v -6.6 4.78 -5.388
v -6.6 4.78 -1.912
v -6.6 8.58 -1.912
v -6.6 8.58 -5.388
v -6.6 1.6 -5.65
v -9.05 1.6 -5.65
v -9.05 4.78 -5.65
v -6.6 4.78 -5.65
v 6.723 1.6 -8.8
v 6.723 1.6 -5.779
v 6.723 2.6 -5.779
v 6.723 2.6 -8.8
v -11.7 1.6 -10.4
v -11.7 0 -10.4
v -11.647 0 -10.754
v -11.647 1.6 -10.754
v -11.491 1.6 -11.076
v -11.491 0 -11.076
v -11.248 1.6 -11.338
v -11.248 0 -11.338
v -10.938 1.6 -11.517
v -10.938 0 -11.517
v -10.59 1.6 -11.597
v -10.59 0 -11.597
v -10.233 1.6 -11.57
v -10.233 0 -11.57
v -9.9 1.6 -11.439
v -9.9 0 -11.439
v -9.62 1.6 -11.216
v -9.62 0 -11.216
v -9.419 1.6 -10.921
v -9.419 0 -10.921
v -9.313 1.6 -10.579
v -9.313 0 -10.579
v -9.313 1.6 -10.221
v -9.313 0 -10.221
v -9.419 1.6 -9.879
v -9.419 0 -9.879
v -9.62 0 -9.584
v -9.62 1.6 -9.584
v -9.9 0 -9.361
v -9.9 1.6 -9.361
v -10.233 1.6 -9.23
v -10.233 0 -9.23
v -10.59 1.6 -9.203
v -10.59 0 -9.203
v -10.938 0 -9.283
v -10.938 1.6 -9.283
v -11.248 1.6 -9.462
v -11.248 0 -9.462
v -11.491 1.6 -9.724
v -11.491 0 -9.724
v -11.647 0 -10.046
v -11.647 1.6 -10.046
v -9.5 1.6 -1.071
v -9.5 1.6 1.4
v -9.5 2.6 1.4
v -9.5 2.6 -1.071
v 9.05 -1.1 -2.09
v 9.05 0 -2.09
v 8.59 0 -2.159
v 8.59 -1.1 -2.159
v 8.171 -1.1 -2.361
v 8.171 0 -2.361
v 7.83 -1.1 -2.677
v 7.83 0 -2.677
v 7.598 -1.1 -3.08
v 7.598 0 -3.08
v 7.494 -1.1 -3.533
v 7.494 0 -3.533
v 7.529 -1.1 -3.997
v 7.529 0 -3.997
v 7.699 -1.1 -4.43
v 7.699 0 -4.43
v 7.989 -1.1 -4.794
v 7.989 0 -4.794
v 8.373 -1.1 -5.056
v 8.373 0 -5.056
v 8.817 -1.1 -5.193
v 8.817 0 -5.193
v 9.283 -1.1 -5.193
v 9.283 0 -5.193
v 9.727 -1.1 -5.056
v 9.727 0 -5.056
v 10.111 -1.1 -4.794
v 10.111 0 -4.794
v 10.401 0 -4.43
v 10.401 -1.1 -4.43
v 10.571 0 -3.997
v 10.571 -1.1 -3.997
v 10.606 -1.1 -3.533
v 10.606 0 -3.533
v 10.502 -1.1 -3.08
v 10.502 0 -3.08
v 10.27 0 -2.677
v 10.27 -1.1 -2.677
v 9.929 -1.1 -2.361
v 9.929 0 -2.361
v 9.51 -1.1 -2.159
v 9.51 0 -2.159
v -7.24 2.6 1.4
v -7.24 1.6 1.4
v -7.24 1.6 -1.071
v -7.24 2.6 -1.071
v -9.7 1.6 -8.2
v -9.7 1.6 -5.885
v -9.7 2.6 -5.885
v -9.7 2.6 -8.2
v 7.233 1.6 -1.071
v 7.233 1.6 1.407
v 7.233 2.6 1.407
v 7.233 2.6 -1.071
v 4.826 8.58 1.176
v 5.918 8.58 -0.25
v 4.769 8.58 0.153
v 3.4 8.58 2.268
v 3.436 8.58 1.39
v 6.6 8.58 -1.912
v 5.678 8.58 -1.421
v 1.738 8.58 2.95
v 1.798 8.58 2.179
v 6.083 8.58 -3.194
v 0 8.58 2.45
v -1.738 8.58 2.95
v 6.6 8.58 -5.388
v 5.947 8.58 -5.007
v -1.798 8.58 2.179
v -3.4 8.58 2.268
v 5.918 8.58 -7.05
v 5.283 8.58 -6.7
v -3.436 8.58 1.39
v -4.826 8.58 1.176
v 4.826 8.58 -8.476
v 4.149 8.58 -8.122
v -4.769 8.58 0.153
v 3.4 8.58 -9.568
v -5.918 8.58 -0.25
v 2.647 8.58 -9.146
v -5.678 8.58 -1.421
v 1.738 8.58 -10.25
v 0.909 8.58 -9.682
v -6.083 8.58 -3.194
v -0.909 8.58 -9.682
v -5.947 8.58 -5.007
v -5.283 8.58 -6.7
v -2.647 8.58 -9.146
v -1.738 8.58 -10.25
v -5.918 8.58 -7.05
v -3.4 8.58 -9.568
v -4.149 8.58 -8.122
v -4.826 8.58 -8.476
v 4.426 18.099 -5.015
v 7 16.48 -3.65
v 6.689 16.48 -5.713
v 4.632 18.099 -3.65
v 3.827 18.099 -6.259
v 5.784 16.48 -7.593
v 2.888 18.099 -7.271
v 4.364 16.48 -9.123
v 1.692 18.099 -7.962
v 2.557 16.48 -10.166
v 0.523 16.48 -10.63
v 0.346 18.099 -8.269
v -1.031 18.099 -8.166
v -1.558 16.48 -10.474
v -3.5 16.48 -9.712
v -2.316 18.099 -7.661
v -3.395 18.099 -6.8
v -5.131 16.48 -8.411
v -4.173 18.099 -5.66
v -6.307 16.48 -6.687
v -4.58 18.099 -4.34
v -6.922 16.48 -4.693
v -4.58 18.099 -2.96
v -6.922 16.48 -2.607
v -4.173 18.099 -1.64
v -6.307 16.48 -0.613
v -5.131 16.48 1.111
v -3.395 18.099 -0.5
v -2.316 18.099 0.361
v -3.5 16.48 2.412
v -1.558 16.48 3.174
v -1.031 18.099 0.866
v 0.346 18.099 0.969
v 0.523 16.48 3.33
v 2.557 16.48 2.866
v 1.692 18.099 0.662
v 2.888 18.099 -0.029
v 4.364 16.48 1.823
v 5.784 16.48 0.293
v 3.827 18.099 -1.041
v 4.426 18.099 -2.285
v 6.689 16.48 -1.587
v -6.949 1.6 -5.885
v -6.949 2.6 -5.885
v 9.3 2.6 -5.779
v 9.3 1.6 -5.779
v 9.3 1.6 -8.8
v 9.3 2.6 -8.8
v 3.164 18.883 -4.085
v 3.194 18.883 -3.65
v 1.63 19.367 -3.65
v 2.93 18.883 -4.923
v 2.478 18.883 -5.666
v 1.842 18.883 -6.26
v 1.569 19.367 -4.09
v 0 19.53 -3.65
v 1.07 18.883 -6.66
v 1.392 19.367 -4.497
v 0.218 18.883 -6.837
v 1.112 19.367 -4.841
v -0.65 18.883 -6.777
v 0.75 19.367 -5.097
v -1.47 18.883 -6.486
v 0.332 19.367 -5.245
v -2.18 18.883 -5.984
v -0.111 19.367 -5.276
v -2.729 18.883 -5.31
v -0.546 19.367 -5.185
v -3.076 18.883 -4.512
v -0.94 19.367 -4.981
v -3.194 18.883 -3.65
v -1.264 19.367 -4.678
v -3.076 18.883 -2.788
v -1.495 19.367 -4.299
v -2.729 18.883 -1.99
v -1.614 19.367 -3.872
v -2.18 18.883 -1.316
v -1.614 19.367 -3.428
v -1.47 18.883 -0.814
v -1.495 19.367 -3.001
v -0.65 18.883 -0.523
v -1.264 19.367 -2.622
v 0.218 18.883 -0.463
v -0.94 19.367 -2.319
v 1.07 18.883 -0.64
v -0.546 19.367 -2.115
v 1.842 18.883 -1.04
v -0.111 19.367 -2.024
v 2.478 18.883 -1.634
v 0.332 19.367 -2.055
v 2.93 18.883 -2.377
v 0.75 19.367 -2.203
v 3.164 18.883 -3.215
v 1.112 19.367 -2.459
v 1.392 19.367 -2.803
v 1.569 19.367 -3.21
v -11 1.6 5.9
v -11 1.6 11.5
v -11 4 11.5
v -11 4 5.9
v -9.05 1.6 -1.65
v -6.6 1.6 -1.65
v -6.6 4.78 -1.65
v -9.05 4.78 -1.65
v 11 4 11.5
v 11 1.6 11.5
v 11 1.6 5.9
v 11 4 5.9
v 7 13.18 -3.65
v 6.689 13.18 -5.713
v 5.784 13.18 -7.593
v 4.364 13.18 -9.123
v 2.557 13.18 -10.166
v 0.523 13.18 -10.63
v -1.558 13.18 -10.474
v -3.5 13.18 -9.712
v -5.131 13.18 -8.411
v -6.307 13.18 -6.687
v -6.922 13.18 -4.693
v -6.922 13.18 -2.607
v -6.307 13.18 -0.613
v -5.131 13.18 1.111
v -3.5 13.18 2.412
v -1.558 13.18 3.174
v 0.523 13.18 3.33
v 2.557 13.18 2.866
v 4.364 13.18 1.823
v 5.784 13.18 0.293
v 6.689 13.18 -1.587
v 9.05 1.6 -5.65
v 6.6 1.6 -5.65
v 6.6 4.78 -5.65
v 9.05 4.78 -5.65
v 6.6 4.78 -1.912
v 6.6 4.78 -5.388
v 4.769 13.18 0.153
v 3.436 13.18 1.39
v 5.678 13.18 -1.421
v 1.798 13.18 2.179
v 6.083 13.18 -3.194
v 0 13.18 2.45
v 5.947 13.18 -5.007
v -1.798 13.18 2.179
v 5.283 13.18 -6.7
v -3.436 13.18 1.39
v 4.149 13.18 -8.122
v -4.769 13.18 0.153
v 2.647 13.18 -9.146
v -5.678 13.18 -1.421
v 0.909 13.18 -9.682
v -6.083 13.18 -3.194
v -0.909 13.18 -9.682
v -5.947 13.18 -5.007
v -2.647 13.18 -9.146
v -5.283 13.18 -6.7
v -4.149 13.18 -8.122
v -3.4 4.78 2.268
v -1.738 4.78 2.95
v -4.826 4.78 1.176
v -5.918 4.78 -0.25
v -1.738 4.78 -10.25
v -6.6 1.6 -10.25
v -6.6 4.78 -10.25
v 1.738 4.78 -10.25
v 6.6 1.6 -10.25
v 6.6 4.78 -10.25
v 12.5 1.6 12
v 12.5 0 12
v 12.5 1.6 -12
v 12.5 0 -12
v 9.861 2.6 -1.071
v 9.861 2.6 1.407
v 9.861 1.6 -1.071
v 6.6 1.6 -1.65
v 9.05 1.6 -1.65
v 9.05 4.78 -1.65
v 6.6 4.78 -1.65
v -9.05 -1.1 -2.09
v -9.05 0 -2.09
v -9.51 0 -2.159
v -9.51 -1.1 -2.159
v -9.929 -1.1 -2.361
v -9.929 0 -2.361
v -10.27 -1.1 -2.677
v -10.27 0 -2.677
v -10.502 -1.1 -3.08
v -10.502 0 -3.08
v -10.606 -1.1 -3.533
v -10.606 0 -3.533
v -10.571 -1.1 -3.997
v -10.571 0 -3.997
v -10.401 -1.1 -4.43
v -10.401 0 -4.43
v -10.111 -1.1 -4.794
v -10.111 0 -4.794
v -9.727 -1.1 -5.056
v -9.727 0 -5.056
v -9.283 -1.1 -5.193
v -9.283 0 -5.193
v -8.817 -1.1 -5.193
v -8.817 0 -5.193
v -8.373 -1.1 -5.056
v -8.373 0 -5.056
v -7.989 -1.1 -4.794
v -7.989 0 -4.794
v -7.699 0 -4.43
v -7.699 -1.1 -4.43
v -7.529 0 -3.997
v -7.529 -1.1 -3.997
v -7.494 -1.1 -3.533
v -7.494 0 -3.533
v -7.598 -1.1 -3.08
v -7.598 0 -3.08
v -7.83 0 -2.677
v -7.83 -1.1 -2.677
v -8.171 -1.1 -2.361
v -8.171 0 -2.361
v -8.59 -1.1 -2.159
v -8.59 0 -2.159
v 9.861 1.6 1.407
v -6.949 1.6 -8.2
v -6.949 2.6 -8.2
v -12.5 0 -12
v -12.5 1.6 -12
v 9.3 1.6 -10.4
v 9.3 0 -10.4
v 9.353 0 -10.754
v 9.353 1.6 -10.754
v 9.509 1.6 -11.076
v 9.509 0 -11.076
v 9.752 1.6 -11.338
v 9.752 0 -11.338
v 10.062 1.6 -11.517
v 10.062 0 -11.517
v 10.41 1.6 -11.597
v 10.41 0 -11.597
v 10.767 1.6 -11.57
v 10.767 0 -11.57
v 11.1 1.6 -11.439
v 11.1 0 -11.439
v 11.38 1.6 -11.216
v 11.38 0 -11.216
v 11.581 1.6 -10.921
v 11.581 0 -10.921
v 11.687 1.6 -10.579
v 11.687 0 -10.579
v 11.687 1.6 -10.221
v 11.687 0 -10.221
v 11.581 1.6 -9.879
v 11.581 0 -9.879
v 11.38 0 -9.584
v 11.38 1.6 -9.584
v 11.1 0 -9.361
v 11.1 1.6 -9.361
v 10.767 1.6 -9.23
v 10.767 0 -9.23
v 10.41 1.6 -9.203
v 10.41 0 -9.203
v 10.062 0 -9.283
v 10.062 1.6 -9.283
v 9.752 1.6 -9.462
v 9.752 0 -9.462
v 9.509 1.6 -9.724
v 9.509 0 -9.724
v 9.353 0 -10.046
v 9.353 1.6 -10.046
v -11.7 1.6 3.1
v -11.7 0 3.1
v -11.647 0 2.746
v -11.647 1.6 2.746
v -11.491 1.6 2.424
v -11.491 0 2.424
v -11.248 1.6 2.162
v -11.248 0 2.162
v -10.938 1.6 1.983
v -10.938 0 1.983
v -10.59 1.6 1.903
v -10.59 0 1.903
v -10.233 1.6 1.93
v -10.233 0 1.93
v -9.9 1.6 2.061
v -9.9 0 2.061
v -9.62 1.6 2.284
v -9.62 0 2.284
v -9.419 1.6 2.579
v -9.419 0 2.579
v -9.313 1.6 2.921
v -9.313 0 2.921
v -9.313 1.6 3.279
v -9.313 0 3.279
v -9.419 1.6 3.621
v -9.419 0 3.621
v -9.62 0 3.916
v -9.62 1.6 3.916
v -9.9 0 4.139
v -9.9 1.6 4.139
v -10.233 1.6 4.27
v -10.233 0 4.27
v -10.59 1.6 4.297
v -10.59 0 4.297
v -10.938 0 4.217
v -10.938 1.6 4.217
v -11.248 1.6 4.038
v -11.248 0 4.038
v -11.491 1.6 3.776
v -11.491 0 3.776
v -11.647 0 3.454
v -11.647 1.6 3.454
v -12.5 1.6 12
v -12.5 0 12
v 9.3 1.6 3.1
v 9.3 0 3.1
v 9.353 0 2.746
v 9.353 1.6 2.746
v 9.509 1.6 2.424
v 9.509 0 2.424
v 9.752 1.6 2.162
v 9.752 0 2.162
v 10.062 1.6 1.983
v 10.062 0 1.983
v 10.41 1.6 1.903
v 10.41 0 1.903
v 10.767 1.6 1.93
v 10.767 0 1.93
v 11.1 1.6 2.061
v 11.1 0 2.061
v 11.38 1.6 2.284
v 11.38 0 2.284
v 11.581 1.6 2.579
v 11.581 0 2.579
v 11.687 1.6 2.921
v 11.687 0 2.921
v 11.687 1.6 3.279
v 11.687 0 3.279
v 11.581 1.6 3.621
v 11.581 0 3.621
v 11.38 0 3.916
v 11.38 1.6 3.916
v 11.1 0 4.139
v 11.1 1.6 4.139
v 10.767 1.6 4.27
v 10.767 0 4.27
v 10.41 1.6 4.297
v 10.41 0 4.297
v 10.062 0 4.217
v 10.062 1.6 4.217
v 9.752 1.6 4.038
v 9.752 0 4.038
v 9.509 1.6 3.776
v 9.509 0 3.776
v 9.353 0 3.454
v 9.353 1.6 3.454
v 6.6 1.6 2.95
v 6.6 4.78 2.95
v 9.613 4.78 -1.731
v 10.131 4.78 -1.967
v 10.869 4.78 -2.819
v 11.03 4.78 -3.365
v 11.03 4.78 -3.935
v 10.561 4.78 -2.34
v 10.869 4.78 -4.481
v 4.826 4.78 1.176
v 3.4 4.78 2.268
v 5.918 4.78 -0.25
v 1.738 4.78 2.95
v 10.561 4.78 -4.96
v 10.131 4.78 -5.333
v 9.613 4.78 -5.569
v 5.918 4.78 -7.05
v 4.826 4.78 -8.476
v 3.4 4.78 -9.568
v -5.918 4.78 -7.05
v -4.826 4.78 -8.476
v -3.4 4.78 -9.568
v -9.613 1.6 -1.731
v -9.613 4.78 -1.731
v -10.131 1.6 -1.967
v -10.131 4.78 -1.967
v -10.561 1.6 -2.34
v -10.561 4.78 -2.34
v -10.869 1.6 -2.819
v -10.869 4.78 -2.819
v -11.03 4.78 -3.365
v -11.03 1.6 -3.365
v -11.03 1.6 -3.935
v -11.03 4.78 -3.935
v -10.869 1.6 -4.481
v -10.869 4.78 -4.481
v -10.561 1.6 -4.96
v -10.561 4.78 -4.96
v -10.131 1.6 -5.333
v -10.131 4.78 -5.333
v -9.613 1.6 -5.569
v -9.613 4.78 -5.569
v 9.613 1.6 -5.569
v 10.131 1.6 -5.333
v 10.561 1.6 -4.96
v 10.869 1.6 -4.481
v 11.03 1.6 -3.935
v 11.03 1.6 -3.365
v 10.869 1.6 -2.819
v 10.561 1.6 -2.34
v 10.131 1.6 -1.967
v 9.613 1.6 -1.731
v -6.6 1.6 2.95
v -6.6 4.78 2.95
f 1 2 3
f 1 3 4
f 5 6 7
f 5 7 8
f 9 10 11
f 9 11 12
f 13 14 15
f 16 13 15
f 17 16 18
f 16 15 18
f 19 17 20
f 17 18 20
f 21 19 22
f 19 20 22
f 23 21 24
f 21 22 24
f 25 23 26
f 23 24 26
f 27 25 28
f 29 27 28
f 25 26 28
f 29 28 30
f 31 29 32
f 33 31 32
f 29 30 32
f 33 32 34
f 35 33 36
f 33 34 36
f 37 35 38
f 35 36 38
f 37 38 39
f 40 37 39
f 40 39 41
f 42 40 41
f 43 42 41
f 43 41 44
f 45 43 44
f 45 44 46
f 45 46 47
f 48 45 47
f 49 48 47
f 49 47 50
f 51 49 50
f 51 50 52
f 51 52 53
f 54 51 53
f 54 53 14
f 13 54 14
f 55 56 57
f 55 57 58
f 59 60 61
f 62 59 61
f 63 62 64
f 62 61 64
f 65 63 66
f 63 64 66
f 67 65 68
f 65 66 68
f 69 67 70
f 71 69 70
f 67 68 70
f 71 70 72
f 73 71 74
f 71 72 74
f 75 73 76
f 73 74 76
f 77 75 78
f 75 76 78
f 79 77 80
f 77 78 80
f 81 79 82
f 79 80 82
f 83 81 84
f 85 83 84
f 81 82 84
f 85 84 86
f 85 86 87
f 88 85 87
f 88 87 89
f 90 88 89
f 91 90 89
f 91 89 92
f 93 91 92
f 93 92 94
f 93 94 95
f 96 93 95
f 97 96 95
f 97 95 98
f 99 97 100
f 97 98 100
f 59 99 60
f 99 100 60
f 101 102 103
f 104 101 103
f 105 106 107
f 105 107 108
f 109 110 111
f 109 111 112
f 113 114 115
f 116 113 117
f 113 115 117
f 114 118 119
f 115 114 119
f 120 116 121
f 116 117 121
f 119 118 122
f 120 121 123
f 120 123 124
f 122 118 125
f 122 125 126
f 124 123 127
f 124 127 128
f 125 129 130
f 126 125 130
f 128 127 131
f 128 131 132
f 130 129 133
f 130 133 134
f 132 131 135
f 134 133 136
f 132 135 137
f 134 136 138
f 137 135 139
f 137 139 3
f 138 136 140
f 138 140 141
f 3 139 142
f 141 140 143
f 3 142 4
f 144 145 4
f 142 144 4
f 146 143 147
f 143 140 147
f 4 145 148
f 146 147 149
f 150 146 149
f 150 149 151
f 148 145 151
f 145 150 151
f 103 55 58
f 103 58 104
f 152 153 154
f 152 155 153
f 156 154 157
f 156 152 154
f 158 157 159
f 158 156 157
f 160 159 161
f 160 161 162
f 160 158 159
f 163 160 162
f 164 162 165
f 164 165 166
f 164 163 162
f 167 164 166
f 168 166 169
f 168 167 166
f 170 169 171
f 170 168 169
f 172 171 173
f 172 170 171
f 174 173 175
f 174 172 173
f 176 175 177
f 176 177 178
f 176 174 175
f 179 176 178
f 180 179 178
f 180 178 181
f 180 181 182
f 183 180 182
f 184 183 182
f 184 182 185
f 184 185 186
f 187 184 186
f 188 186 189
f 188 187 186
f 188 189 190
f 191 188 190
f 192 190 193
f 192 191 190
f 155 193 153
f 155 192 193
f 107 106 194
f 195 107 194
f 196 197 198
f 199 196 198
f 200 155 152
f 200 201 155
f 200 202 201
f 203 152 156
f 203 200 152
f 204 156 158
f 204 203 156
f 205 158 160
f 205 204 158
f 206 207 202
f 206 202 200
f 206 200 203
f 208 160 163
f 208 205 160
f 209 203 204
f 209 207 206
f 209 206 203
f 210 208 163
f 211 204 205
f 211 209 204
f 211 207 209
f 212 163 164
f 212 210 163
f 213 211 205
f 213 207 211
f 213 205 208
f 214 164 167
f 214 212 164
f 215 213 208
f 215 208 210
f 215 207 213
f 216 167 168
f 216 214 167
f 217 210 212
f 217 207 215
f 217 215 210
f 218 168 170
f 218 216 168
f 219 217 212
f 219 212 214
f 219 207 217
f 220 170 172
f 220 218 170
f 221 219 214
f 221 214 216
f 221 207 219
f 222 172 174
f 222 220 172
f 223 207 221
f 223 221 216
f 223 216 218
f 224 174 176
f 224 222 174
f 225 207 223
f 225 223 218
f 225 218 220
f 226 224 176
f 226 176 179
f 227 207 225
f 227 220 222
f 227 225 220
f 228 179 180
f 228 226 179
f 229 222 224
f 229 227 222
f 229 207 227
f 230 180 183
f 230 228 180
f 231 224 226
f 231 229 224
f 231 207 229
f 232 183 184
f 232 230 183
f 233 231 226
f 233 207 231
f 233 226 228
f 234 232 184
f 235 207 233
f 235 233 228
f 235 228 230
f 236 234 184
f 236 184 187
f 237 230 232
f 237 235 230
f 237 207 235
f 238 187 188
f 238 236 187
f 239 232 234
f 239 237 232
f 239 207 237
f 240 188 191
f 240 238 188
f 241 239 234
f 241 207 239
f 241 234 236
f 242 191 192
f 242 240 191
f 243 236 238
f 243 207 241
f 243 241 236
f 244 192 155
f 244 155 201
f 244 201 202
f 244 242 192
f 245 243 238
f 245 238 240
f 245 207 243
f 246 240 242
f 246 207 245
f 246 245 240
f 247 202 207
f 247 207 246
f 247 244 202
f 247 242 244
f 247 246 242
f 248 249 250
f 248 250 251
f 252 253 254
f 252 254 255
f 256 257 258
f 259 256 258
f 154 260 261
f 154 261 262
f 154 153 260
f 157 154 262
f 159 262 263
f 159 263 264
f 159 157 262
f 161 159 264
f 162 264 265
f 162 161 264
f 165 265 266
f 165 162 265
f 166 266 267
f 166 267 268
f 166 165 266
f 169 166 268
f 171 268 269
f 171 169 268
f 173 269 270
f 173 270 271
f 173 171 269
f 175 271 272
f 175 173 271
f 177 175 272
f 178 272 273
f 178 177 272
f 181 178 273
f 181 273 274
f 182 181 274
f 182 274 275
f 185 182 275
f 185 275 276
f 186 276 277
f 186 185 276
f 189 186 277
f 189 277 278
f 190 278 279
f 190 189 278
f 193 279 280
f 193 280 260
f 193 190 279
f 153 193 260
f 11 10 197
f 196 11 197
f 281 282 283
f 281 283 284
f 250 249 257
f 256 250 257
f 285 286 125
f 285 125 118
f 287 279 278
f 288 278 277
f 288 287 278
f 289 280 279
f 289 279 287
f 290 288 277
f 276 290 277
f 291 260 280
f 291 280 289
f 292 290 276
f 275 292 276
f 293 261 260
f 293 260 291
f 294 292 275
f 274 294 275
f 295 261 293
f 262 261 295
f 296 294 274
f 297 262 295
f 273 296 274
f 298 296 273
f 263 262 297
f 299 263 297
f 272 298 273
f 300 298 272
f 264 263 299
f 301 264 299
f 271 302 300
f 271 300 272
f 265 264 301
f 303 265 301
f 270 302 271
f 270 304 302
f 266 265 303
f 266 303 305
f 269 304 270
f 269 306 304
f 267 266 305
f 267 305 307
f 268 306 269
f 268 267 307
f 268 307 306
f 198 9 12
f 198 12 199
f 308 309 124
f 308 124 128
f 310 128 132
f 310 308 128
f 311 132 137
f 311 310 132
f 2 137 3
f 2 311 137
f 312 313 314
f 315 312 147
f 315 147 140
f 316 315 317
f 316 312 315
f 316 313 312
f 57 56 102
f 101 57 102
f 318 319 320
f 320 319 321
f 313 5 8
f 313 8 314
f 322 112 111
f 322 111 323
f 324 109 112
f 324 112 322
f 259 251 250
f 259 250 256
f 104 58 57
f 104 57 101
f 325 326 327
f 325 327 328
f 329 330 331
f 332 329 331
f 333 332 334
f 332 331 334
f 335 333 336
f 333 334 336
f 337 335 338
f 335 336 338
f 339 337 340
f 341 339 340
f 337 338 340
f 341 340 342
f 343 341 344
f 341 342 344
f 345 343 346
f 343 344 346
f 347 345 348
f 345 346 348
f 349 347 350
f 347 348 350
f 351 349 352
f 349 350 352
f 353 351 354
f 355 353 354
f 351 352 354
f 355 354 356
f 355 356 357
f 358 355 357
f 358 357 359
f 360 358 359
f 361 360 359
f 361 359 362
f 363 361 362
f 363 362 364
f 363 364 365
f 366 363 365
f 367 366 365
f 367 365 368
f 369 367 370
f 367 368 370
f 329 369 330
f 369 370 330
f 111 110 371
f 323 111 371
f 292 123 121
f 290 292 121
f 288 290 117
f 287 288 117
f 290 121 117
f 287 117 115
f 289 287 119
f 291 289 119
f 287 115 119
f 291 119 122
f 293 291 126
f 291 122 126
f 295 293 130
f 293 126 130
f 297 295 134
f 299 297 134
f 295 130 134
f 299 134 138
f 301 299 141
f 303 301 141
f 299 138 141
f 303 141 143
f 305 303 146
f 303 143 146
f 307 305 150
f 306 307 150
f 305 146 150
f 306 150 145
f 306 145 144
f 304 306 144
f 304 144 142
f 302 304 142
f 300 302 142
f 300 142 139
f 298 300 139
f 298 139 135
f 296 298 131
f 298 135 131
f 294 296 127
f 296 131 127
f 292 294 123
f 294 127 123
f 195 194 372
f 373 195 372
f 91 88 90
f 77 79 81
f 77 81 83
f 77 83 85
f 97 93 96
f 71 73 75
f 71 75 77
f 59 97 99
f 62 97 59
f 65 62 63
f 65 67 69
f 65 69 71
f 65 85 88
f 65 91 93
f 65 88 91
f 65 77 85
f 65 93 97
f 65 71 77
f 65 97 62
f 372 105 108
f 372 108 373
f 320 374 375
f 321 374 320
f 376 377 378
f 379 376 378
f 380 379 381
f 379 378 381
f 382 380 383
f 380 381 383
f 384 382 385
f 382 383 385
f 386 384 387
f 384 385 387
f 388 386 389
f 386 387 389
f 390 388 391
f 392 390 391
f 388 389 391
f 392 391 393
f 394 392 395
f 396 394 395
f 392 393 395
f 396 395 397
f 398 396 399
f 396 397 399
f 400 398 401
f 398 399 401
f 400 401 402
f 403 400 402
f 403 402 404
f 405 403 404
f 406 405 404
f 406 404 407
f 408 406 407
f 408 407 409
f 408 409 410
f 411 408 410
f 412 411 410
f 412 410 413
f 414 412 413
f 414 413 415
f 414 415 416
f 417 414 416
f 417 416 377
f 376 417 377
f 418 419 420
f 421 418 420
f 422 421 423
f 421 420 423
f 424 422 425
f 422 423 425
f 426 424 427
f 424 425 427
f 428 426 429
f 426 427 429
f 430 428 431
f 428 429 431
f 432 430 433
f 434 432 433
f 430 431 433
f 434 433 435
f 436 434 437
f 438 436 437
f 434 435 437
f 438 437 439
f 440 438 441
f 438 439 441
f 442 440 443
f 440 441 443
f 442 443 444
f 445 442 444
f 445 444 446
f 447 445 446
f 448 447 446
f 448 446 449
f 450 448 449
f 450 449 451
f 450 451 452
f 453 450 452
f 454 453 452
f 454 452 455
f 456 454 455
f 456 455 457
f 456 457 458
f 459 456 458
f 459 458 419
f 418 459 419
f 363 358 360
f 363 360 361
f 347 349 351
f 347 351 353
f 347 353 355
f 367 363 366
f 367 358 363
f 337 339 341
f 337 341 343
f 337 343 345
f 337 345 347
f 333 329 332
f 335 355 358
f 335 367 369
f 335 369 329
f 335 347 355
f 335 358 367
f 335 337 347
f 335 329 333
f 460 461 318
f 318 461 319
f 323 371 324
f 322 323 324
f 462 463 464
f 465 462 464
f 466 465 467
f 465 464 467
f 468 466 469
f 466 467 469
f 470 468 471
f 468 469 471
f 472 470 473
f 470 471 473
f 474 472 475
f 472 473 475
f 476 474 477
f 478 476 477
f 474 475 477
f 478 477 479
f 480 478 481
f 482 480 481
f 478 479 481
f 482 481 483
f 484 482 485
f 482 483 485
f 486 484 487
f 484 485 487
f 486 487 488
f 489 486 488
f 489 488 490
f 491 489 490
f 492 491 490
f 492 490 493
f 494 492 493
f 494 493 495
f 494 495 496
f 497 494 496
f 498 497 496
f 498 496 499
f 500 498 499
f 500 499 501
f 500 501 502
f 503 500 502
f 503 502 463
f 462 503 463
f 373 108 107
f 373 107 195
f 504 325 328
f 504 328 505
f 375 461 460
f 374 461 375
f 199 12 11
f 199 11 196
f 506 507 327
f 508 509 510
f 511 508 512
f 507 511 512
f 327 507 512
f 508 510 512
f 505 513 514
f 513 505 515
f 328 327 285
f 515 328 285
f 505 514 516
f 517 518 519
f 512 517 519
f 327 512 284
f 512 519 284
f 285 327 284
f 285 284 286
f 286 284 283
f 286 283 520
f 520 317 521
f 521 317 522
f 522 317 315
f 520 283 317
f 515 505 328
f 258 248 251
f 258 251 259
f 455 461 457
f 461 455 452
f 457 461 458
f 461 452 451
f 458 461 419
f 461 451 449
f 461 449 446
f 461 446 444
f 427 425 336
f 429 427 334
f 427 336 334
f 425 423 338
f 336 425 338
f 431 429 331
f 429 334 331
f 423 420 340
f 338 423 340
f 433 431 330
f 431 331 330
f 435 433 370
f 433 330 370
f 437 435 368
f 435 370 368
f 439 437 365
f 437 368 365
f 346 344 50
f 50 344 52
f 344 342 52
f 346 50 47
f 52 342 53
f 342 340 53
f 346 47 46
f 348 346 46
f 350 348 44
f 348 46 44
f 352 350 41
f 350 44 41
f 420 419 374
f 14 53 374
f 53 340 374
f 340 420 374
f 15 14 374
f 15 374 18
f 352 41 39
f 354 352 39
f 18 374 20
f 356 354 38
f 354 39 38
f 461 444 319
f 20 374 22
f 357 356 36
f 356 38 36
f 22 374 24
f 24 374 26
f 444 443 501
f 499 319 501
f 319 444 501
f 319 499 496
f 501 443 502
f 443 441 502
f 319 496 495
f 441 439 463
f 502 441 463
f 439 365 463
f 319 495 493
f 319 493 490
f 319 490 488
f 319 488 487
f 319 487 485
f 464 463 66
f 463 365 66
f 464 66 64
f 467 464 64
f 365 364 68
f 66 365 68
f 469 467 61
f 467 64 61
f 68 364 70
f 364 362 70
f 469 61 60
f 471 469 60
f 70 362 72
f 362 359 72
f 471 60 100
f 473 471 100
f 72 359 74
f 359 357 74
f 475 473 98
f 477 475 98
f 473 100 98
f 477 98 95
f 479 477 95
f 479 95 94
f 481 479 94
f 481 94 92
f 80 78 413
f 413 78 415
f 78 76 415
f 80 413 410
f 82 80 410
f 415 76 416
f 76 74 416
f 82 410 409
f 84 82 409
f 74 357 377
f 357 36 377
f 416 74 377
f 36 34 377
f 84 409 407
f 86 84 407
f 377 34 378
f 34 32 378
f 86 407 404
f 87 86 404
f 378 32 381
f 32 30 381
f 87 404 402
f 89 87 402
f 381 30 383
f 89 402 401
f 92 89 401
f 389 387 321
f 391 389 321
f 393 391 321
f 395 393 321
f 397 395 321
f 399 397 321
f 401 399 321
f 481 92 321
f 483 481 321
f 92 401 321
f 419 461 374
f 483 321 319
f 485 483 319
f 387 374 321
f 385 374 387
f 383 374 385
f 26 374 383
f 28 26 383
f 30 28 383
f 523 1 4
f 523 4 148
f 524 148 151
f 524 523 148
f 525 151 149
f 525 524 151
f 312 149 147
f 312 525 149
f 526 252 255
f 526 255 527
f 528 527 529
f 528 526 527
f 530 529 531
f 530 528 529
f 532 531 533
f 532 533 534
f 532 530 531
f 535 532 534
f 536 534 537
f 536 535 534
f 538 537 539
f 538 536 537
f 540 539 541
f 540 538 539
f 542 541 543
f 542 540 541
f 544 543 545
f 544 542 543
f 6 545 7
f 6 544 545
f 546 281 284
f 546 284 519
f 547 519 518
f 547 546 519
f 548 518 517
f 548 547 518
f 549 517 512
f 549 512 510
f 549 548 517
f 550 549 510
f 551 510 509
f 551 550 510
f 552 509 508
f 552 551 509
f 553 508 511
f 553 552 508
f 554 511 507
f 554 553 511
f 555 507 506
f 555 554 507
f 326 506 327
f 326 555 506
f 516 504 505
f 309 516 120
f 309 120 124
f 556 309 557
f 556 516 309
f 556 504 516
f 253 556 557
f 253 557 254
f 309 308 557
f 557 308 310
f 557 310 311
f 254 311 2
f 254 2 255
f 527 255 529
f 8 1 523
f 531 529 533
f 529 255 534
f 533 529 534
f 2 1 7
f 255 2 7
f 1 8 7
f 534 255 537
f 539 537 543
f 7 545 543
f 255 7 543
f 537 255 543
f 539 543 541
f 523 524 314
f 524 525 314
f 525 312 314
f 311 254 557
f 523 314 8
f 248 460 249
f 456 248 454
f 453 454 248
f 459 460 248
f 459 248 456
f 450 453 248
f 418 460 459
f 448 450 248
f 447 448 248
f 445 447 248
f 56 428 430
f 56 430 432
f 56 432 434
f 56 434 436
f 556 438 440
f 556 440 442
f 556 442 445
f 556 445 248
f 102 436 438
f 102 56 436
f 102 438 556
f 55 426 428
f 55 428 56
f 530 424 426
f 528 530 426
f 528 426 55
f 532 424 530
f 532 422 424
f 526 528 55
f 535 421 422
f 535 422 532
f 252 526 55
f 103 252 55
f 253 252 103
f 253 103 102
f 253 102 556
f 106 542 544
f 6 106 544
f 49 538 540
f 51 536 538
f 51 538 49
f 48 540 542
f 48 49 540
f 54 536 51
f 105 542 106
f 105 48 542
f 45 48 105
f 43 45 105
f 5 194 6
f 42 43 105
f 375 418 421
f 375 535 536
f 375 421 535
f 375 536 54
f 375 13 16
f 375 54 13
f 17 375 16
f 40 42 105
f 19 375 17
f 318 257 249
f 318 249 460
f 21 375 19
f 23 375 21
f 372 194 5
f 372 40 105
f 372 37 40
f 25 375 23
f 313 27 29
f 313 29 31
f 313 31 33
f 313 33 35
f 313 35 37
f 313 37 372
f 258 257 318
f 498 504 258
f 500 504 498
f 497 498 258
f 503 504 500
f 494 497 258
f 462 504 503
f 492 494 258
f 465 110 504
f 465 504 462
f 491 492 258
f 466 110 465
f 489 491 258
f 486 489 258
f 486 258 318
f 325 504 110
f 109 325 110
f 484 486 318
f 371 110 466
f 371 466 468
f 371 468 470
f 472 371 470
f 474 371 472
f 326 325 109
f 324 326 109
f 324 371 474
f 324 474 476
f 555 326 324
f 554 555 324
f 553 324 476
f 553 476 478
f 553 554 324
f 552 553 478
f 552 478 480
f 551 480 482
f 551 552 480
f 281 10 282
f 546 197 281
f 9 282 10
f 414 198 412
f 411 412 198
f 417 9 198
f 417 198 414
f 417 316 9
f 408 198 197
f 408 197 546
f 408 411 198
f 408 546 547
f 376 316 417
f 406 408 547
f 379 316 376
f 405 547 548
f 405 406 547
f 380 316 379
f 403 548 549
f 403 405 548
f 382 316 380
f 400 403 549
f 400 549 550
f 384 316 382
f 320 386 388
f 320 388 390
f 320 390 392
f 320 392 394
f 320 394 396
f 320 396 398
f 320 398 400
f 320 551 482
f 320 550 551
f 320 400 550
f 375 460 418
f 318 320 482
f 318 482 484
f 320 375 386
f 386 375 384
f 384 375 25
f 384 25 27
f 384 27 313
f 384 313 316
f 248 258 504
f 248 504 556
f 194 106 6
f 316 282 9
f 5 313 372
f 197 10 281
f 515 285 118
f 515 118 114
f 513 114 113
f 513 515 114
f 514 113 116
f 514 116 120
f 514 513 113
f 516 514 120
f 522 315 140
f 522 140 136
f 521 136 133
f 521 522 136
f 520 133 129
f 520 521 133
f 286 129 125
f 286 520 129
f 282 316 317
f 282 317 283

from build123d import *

# Parameters (mm, degrees)
ESQUISSE1_W        = 25
ESQUISSE1_H        = 24
BOSS_EXTRU_1_DEPTH = 1.6
BOSS_EXTRU_2_DEPTH = 3.18
BOSS_EXTRU_3_DEPTH = 3.8
ESQUISSE6_R        = 6.1
BOSS_EXTRU_4_DEPTH = 4.6
D_GAGEMENT_M21_D   = 2.4
ESQUISSE11_W       = 22
ESQUISSE11_H       = 5.6
BOSS_EXTRU_6_DEPTH = 2.4
ESQUISSE12_R       = 1.56
BOSS_EXTRU_7_DEPTH = 1.1
ESQUISSE13_W       = 2.577210691
ESQUISSE13_H       = 3.020616424
ESQUISSE13_W_2     = 2.628074632
ESQUISSE13_H_2     = 2.477608005
ESQUISSE13_W_3     = 2.260050421
ESQUISSE13_H_3     = 2.470679231
ESQUISSE13_W_4     = 2.751019587
ESQUISSE13_H_4     = 2.314618906
BOSS_EXTRU_8_DEPTH = 1


with BuildPart() as part:
    # Esquisse1 → Boss.-Extru.1 (new body)
    with BuildSketch(Plane(origin=(0, 0, 0), x_dir=(1, 0, 0), z_dir=(0, 1, 0))):
        Rectangle(ESQUISSE1_W, ESQUISSE1_H)
    extrude(amount=BOSS_EXTRU_1_DEPTH)

    # Esquisse4 → Boss.-Extru.2 (add)
    with BuildSketch(Plane(origin=(0, 1.6, 0), x_dir=(1, 0, 0), z_dir=(0, 1, 0))):
        with BuildLine():
            Line((6.6, 10.25), (6.6, 5.65))
            Line((6.6, 5.65), (9.05, 5.65))
            ThreePointArc((9.05, 5.65), (11.05, 3.65), (9.05, 1.65))
            Line((9.05, 1.65), (6.6, 1.65))
            Line((6.6, 1.65), (6.6, -2.95))
            Line((6.6, -2.95), (-6.6, -2.95))
            Line((-6.6, -2.95), (-6.6, 1.65))
            Line((-6.6, 1.65), (-9.05, 1.65))
            ThreePointArc((-9.05, 1.65), (-11.05, 3.65), (-9.05, 5.65))
            Line((-9.05, 5.65), (-6.6, 5.65))
            Line((-6.6, 5.65), (-6.6, 10.25))
            Line((-6.6, 10.25), (6.6, 10.25))
        make_face()
    extrude(amount=BOSS_EXTRU_2_DEPTH)

    # Esquisse5 → Boss.-Extru.3 (add)
    with BuildSketch(Plane(origin=(0, 4.78, 0), x_dir=(1, 0, 0), z_dir=(0, 1, 0))):
        with BuildLine():
            Line((-6.6, 1.912005466), (-6.6, 5.387994534))
            ThreePointArc((-6.6, 5.387994534), (-4.826003782, 8.476003782), (-1.737994534, 10.25))
            Line((-1.737994534, 10.25), (1.737994534, 10.25))
            ThreePointArc((1.737994534, 10.25), (4.826003782, 8.476003782), (6.6, 5.387994534))
            Line((6.6, 5.387994534), (6.6, 1.912005466))
            ThreePointArc((6.6, 1.912005466), (4.826003782, -1.176003782), (1.737994534, -2.95))
            Line((1.737994534, -2.95), (-1.737994534, -2.95))
            ThreePointArc((-1.737994534, -2.95), (-4.826003782, -1.176003782), (-6.6, 1.912005466))
        make_face()
    extrude(amount=BOSS_EXTRU_3_DEPTH)

    # Esquisse6 → Boss.-Extru.4 (add)
    with BuildSketch(Plane(origin=(0, 8.58, 0), x_dir=(1, 0, 0), z_dir=(0, 1, 0))):
        with Locations((0, 3.65)):
            Circle(ESQUISSE6_R)
    extrude(amount=BOSS_EXTRU_4_DEPTH)

    # Esquisse8 → Révolution1 (revolve)
    with BuildSketch(Plane.XY.offset(-3.65)):
        with BuildLine():
            Line((0, 13.18), (-7, 13.18))
            Line((-7, 13.18), (-7, 16.48))
            Line((-7, 16.48), (-4.631719117, 18.098501714))
            ThreePointArc((-4.631719117, 18.098501714), (-2.423943549, 19.163964644), (0, 19.53))
            Line((0, 19.53), (0, 13.18))
        make_face()
    revolve(axis=Axis((0, 13.18, -3.65), (0, 1, 0)))

    # Dégagement M21 (through all)
    with Locations(Plane(origin=(0, 1.6, 0), x_dir=(1, 0, 0), z_dir=(0, 1, 0))):
        with Locations((-10.5, 10.4), (10.5, 10.4), (10.5, -3.1), (-10.5, -3.1)):
            Hole(D_GAGEMENT_M21_D / 2)

    # Esquisse11 → Boss.-Extru.6 (add)
    with BuildSketch(Plane(origin=(0, 1.6, 0), x_dir=(1, 0, 0), z_dir=(0, 1, 0))):
        with Locations((0, -8.7)):
            Rectangle(ESQUISSE11_W, ESQUISSE11_H)
    extrude(amount=BOSS_EXTRU_6_DEPTH)

    # Esquisse12 → Boss.-Extru.7 (add)
    with BuildSketch(Plane.XZ):
        with Locations((-9.05, -3.65)):
            Circle(ESQUISSE12_R)
        with Locations((9.05, -3.65)):
            Circle(ESQUISSE12_R)
    extrude(amount=BOSS_EXTRU_7_DEPTH)

    # Esquisse13 → Boss.-Extru.8 (add)
    with BuildSketch(Plane(origin=(0, 1.6, 0), x_dir=(1, 0, 0), z_dir=(0, 1, 0))):
        with Locations((8.011394655, 7.289691788)):
            Rectangle(ESQUISSE13_W, ESQUISSE13_H)
        with Locations((8.546867327, -0.168124771)):
            Rectangle(ESQUISSE13_W_2, ESQUISSE13_H_2)
        with Locations((-8.36997479, -0.164660384)):
            Rectangle(ESQUISSE13_W_3, ESQUISSE13_H_3)
        with Locations((-8.324490207, 7.042690547)):
            Rectangle(ESQUISSE13_W_4, ESQUISSE13_H_4)
    extrude(amount=BOSS_EXTRU_8_DEPTH)


solid = part.part
